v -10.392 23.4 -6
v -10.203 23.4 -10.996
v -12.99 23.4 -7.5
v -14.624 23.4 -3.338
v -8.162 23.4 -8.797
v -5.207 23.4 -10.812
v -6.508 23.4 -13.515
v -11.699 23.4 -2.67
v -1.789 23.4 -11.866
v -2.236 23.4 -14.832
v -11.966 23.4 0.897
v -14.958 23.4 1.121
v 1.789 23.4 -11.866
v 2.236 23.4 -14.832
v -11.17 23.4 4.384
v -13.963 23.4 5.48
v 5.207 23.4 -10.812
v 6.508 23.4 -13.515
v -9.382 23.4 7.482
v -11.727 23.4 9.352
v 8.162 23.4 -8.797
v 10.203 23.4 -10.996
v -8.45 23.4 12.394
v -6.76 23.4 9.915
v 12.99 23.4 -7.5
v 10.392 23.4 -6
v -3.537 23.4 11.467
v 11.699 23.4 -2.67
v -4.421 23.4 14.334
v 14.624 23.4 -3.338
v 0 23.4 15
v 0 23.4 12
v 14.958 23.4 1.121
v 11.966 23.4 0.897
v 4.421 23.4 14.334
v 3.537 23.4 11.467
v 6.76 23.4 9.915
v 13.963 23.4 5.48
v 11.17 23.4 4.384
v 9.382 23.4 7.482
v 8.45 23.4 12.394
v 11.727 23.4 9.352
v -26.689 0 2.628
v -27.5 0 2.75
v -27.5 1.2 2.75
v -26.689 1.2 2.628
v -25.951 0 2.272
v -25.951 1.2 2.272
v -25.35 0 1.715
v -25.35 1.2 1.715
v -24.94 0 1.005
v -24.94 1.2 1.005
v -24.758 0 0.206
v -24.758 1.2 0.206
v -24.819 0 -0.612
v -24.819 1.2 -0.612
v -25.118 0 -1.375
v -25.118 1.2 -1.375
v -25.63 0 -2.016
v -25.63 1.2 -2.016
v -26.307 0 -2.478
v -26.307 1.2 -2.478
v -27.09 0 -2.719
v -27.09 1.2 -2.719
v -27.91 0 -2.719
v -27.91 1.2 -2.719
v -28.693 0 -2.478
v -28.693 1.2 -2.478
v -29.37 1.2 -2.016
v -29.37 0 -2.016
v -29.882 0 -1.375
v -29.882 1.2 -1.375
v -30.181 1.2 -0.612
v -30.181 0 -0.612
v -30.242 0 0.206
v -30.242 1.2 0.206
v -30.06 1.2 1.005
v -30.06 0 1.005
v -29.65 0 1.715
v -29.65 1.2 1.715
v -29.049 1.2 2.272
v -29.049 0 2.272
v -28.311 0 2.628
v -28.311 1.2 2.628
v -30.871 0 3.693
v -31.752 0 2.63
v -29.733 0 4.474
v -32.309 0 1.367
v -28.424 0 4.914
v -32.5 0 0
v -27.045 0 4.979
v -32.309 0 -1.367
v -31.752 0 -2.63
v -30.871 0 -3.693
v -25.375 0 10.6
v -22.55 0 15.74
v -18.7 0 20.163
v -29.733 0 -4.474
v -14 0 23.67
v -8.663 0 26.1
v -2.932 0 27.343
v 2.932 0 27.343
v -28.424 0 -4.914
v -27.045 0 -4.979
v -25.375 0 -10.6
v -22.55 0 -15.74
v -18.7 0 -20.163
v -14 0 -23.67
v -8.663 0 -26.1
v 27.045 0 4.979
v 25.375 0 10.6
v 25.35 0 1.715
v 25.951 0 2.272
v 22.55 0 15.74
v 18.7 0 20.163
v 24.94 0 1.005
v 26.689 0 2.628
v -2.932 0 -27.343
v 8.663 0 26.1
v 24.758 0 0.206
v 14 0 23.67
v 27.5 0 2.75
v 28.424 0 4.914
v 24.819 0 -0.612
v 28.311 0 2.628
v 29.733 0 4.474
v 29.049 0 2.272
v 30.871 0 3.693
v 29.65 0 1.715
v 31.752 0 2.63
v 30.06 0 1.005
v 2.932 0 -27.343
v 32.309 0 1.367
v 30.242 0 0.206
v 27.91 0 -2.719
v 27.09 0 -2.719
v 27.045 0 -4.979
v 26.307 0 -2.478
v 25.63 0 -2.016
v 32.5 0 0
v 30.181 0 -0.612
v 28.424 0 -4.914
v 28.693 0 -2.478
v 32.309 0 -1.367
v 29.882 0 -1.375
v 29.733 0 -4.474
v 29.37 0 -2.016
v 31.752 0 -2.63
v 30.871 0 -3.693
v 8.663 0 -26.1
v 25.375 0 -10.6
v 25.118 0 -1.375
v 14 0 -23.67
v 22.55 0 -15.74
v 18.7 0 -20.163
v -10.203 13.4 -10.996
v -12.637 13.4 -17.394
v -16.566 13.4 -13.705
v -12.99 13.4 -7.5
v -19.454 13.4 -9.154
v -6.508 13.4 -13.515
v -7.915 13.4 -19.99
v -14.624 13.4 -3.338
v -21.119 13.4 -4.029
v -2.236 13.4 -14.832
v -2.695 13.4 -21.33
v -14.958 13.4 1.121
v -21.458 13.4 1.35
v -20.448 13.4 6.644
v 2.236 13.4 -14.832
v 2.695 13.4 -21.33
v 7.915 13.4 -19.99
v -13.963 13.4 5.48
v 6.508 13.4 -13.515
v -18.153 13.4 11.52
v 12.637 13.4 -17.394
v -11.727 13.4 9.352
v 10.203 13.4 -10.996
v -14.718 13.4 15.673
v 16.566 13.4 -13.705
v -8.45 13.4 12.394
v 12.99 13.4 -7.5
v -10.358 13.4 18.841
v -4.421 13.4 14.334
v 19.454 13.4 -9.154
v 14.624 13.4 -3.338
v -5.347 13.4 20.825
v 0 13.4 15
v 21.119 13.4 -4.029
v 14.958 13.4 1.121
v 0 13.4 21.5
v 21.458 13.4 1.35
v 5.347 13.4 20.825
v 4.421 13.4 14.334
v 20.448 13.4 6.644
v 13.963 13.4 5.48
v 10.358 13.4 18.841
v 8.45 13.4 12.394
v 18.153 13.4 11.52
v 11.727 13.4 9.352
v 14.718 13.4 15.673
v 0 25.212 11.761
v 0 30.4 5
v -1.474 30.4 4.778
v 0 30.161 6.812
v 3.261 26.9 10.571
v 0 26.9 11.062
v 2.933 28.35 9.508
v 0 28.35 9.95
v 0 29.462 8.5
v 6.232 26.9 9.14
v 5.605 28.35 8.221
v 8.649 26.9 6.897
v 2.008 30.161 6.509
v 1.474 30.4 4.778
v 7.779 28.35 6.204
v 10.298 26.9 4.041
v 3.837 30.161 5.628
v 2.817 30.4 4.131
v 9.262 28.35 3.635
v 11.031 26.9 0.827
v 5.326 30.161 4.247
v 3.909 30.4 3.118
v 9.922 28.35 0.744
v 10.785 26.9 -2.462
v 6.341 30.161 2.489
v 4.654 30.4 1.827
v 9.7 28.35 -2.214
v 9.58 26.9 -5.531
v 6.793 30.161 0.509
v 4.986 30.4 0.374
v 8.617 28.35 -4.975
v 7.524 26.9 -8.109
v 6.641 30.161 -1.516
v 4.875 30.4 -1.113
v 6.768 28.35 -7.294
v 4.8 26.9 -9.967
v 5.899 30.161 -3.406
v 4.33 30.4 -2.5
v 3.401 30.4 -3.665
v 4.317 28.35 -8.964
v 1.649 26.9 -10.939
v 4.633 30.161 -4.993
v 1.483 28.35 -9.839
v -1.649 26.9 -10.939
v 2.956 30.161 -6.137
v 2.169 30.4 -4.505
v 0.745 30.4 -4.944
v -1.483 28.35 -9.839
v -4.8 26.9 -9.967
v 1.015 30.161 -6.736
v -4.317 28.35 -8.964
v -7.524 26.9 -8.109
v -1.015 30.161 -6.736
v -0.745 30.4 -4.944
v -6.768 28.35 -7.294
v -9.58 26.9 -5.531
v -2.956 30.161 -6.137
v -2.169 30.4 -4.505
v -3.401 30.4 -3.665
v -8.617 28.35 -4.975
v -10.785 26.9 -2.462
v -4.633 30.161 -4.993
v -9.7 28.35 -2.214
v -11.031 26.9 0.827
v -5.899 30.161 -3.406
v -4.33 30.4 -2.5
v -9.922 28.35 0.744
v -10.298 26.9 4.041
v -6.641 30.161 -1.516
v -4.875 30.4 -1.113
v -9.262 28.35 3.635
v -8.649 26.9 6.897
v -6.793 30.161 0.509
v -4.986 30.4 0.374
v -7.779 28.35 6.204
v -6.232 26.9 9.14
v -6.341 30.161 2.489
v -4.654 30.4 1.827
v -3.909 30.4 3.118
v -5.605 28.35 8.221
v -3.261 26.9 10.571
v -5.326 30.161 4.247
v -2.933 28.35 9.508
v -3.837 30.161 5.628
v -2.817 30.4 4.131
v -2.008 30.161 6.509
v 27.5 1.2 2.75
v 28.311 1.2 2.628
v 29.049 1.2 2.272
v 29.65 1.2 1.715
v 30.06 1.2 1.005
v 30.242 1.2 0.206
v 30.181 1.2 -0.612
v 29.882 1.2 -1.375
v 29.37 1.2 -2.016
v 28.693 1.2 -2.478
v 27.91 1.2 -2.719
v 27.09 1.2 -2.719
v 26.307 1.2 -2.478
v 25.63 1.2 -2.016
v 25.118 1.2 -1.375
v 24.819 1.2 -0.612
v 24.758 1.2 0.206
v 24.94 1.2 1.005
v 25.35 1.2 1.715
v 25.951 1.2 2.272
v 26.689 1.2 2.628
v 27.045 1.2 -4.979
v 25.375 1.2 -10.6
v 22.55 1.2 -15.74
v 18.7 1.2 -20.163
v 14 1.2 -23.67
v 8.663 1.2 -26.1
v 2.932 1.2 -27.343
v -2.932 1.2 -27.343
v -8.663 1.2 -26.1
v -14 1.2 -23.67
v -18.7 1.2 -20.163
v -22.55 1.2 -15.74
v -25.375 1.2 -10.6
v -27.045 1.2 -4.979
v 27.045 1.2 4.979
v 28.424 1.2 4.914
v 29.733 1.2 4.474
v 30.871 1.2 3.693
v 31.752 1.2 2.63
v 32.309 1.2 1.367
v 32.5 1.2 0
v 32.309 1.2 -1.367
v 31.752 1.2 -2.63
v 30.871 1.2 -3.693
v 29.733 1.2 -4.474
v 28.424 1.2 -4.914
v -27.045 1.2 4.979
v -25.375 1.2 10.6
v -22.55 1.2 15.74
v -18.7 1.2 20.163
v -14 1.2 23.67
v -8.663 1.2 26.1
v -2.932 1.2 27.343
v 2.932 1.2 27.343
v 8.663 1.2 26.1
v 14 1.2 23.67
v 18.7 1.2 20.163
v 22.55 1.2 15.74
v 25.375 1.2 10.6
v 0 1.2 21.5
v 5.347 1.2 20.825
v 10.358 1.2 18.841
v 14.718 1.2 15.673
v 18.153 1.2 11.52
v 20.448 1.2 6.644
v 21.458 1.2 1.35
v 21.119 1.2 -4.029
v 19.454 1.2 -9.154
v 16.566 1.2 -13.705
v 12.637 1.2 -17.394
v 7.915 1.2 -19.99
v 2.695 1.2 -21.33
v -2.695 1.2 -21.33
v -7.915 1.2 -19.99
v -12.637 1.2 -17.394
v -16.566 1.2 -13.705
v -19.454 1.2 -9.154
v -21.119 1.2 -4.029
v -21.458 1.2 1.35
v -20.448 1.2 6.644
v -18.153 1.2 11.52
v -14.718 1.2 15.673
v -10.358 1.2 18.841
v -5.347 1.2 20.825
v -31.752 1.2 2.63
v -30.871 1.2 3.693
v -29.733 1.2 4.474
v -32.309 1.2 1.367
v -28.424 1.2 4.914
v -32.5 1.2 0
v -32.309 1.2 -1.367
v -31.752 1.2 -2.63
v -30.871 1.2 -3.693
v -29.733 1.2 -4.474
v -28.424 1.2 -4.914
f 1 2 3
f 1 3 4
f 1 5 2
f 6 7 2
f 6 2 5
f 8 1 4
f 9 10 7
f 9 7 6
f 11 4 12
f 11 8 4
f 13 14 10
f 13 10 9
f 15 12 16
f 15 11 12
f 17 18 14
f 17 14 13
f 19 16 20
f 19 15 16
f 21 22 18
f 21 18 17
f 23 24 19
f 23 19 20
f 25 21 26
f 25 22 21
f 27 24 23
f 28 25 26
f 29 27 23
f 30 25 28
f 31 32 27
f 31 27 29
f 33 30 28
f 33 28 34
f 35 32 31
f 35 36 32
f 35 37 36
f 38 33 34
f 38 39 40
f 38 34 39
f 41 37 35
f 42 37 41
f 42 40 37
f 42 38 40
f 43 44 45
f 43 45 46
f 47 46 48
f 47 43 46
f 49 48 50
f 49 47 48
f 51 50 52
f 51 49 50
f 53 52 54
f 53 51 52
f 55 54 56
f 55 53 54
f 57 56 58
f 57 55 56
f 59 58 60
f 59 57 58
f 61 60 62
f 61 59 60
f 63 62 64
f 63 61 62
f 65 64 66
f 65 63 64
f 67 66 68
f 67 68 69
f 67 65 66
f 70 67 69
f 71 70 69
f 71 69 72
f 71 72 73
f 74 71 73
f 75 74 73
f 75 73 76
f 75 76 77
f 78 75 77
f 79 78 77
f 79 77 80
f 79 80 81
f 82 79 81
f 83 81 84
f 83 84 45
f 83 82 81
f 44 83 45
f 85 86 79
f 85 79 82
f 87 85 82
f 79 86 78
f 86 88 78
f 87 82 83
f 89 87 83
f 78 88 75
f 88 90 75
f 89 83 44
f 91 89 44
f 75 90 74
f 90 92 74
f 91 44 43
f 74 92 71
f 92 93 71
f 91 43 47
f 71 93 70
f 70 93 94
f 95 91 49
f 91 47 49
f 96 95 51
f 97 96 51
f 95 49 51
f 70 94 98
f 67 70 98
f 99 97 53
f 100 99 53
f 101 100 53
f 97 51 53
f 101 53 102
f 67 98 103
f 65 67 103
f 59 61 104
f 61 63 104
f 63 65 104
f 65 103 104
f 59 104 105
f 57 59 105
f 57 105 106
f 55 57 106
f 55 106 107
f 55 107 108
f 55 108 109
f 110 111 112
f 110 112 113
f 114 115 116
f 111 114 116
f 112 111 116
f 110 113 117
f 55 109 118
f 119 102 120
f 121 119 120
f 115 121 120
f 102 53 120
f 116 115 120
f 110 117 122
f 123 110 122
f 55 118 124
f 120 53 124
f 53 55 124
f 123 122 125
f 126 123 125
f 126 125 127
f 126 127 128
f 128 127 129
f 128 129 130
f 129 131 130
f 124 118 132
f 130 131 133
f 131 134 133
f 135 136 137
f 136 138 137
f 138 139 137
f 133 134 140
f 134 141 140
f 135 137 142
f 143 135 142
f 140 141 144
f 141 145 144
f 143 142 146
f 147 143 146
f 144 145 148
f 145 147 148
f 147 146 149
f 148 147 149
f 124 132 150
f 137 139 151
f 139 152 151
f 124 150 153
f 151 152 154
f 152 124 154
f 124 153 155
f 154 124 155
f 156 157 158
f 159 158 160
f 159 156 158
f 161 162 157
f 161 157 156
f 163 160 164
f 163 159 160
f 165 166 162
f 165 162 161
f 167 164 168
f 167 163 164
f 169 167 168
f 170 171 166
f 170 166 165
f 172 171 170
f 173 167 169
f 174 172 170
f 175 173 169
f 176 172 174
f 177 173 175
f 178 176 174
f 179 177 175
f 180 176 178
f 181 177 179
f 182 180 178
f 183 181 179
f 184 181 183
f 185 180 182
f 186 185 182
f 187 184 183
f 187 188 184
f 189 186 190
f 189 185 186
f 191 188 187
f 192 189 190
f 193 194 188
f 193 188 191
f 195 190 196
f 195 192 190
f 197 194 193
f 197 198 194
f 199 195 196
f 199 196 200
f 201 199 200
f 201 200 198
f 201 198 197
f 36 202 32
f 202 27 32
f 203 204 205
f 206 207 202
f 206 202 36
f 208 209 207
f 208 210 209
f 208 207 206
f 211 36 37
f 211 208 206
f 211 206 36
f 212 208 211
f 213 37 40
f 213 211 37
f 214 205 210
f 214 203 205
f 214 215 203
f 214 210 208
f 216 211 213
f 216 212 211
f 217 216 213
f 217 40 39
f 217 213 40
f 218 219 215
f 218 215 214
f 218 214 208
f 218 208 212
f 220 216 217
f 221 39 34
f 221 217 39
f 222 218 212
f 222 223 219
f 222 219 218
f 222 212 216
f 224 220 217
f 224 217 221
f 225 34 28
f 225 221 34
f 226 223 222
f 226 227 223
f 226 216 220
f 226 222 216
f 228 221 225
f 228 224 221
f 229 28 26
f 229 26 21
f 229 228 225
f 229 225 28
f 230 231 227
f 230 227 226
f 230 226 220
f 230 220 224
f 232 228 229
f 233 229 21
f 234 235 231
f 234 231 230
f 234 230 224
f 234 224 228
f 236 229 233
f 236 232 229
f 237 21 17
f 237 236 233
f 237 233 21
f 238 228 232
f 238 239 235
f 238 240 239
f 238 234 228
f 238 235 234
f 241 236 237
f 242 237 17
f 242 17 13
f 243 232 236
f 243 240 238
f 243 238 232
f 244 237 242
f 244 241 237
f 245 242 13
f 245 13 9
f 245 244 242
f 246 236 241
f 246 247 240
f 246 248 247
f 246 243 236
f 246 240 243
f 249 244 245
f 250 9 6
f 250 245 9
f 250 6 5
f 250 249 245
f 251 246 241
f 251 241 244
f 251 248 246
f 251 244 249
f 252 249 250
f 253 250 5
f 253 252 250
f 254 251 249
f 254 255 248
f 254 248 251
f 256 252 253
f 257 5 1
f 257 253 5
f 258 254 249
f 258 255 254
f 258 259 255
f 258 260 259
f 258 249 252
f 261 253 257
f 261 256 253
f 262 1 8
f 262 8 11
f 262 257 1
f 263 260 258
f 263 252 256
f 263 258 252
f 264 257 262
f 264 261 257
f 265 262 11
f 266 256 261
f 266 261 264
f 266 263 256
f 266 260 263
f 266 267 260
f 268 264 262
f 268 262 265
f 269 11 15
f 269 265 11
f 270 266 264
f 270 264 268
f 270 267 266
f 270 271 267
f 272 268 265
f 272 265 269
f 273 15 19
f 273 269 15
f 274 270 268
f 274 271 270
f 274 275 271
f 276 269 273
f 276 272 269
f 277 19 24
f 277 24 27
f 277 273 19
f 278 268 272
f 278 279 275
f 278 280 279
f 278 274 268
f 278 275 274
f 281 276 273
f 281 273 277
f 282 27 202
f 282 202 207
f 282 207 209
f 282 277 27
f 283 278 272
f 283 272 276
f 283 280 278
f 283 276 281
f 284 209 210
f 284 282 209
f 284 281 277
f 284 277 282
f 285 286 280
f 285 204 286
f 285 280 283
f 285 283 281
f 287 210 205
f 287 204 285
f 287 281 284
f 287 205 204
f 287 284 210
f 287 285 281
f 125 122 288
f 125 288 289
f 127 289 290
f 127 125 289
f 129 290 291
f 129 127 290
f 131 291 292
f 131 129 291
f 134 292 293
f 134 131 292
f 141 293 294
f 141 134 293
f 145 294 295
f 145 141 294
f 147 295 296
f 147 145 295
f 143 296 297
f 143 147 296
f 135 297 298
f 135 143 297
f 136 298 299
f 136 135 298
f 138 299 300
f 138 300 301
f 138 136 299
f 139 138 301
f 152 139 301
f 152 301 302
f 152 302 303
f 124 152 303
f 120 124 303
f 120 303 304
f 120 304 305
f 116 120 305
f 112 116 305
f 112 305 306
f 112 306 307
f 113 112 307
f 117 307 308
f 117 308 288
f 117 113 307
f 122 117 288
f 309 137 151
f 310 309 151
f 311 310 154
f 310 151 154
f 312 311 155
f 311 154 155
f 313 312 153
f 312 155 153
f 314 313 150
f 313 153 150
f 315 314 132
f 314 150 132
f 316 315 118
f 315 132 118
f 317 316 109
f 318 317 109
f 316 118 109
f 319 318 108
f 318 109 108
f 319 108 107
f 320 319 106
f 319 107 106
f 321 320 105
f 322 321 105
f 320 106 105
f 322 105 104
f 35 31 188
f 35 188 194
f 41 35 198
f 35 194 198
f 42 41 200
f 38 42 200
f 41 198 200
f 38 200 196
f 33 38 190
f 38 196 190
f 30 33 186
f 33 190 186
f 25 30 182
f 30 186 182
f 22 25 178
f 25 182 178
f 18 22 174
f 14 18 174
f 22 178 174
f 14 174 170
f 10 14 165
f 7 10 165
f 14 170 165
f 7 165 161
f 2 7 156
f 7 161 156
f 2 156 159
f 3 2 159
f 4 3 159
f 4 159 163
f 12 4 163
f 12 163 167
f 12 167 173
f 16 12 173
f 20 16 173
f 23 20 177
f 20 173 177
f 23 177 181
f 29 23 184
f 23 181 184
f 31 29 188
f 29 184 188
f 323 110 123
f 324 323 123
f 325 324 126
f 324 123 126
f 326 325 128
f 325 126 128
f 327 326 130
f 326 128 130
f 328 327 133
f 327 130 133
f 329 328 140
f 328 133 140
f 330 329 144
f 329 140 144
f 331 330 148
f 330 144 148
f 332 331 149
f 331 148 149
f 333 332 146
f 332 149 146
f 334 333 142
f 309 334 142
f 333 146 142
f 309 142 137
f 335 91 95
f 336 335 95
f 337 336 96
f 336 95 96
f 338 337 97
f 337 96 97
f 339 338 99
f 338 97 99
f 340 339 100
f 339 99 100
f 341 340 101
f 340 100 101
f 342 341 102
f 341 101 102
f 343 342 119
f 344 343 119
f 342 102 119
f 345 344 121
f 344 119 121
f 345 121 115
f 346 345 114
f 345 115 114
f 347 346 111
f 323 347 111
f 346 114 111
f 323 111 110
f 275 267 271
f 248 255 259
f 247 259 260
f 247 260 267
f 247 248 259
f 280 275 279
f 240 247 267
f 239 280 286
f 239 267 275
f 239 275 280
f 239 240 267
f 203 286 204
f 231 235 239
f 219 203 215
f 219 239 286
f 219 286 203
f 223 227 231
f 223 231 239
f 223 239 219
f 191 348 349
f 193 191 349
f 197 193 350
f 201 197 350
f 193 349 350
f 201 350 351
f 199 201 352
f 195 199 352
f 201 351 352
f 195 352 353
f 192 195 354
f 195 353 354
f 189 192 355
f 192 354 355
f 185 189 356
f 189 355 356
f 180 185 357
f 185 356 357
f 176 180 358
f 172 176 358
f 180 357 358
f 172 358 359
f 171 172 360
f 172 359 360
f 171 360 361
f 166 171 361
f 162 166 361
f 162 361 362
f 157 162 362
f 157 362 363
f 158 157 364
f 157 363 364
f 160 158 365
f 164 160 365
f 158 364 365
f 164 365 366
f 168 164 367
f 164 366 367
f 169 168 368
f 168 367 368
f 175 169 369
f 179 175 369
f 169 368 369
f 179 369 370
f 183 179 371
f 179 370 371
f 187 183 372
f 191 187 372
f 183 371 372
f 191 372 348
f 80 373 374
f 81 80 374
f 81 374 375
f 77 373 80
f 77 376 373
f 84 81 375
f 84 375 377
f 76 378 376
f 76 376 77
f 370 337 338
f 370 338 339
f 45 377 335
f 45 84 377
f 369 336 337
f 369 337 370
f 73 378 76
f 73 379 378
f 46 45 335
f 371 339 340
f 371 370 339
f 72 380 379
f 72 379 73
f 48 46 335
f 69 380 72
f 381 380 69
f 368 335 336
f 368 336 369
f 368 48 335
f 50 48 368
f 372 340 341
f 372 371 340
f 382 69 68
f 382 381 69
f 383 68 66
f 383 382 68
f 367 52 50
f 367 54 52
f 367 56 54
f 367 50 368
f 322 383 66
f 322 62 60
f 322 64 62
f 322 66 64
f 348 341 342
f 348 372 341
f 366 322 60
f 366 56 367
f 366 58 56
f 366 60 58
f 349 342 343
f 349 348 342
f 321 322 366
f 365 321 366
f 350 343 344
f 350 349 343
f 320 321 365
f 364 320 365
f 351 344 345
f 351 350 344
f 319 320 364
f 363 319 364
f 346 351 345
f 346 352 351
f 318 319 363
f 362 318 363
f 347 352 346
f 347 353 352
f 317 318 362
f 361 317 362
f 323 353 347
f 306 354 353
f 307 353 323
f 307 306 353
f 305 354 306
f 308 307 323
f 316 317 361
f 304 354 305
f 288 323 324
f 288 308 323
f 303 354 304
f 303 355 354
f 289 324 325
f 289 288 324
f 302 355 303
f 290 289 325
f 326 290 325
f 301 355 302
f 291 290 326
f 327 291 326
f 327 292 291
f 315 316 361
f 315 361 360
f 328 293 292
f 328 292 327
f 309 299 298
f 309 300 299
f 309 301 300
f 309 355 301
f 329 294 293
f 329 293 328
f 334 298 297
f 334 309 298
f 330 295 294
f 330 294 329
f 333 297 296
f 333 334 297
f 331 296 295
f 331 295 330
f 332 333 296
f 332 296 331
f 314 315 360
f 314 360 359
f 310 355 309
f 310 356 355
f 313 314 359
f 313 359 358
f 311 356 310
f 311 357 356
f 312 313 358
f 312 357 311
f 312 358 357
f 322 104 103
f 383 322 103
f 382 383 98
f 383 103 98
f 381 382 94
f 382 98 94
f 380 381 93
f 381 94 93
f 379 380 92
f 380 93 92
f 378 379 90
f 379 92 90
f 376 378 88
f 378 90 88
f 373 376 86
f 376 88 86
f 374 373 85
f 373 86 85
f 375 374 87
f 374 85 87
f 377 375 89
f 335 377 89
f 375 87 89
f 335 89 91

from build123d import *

# Parameters (mm, degrees)
SKETCH1_R           = 2.75
BOSS_EXTRUDE1_DEPTH = 1.2
SKETCH2_R           = 21.5
BOSS_EXTRUDE2_DEPTH = 12.2
SKETCH3_R           = 15
BOSS_EXTRUDE3_DEPTH = 10
SKETCH5_R           = 12
BOSS_EXTRUDE4_DEPTH = 7
FILLET1_R           = 7


with BuildPart() as part:
    # Sketch1 → Boss-Extrude1 (new body)
    with BuildSketch(Plane(origin=(0, 0, 0), x_dir=(1, 0, 0), z_dir=(0, 1, 0))):
        with BuildLine():
            ThreePointArc((-27.045454545, -4.979295977), (0, -27.5), (27.045454545, -4.979295977))
            ThreePointArc((27.045454545, -4.979295977), (32.5, 0), (27.045454545, 4.979295977))
            ThreePointArc((27.045454545, 4.979295977), (0, 27.5), (-27.045454545, 4.979295977))
            ThreePointArc((-27.045454545, 4.979295977), (-32.5, 0), (-27.045454545, -4.979295977))
        make_face()
        with Locations(Location((-27.5, 0, 0), (0, 0, 270))):
            Circle(SKETCH1_R, mode=Mode.SUBTRACT)
        with Locations(Location((27.5, 0, 0), (0, 0, 270))):
            Circle(SKETCH1_R, mode=Mode.SUBTRACT)
    extrude(amount=BOSS_EXTRUDE1_DEPTH)

    # Sketch2 → Boss-Extrude2 (add)
    with BuildSketch(Plane(origin=(0, 1.2, 0), x_dir=(1, 0, 0), z_dir=(0, 1, 0))):
        with Locations(Location((0, 0, 0), (0, 0, 270))):
            Circle(SKETCH2_R)
    extrude(amount=BOSS_EXTRUDE2_DEPTH)

    # Sketch3 → Boss-Extrude3 (add)
    with BuildSketch(Plane(origin=(0, 13.4, 0), x_dir=(1, 0, 0), z_dir=(0, 1, 0))):
        with Locations(Location((0, 0, 0), (0, 0, 270))):
            Circle(SKETCH3_R)
    extrude(amount=BOSS_EXTRUDE3_DEPTH)

    # Sketch5 → Boss-Extrude4 (add)
    with BuildSketch(Plane(origin=(0, 23.4, 0), x_dir=(1, 0, 0), z_dir=(0, 1, 0))):
        with Locations(Location((0, 0, 0), (0, 0, 270))):
            Circle(SKETCH5_R)
    extrude(amount=BOSS_EXTRUDE4_DEPTH)

    # Fillet1
    fillet1_edges = [part.edges().sort_by_distance(p)[0] for p in [
        (0, 30.4, -12),
    ]]
    fillet(fillet1_edges, radius=FILLET1_R - 0.0001)  # a hair under: the kernel refuses the full size


solid = part.part
